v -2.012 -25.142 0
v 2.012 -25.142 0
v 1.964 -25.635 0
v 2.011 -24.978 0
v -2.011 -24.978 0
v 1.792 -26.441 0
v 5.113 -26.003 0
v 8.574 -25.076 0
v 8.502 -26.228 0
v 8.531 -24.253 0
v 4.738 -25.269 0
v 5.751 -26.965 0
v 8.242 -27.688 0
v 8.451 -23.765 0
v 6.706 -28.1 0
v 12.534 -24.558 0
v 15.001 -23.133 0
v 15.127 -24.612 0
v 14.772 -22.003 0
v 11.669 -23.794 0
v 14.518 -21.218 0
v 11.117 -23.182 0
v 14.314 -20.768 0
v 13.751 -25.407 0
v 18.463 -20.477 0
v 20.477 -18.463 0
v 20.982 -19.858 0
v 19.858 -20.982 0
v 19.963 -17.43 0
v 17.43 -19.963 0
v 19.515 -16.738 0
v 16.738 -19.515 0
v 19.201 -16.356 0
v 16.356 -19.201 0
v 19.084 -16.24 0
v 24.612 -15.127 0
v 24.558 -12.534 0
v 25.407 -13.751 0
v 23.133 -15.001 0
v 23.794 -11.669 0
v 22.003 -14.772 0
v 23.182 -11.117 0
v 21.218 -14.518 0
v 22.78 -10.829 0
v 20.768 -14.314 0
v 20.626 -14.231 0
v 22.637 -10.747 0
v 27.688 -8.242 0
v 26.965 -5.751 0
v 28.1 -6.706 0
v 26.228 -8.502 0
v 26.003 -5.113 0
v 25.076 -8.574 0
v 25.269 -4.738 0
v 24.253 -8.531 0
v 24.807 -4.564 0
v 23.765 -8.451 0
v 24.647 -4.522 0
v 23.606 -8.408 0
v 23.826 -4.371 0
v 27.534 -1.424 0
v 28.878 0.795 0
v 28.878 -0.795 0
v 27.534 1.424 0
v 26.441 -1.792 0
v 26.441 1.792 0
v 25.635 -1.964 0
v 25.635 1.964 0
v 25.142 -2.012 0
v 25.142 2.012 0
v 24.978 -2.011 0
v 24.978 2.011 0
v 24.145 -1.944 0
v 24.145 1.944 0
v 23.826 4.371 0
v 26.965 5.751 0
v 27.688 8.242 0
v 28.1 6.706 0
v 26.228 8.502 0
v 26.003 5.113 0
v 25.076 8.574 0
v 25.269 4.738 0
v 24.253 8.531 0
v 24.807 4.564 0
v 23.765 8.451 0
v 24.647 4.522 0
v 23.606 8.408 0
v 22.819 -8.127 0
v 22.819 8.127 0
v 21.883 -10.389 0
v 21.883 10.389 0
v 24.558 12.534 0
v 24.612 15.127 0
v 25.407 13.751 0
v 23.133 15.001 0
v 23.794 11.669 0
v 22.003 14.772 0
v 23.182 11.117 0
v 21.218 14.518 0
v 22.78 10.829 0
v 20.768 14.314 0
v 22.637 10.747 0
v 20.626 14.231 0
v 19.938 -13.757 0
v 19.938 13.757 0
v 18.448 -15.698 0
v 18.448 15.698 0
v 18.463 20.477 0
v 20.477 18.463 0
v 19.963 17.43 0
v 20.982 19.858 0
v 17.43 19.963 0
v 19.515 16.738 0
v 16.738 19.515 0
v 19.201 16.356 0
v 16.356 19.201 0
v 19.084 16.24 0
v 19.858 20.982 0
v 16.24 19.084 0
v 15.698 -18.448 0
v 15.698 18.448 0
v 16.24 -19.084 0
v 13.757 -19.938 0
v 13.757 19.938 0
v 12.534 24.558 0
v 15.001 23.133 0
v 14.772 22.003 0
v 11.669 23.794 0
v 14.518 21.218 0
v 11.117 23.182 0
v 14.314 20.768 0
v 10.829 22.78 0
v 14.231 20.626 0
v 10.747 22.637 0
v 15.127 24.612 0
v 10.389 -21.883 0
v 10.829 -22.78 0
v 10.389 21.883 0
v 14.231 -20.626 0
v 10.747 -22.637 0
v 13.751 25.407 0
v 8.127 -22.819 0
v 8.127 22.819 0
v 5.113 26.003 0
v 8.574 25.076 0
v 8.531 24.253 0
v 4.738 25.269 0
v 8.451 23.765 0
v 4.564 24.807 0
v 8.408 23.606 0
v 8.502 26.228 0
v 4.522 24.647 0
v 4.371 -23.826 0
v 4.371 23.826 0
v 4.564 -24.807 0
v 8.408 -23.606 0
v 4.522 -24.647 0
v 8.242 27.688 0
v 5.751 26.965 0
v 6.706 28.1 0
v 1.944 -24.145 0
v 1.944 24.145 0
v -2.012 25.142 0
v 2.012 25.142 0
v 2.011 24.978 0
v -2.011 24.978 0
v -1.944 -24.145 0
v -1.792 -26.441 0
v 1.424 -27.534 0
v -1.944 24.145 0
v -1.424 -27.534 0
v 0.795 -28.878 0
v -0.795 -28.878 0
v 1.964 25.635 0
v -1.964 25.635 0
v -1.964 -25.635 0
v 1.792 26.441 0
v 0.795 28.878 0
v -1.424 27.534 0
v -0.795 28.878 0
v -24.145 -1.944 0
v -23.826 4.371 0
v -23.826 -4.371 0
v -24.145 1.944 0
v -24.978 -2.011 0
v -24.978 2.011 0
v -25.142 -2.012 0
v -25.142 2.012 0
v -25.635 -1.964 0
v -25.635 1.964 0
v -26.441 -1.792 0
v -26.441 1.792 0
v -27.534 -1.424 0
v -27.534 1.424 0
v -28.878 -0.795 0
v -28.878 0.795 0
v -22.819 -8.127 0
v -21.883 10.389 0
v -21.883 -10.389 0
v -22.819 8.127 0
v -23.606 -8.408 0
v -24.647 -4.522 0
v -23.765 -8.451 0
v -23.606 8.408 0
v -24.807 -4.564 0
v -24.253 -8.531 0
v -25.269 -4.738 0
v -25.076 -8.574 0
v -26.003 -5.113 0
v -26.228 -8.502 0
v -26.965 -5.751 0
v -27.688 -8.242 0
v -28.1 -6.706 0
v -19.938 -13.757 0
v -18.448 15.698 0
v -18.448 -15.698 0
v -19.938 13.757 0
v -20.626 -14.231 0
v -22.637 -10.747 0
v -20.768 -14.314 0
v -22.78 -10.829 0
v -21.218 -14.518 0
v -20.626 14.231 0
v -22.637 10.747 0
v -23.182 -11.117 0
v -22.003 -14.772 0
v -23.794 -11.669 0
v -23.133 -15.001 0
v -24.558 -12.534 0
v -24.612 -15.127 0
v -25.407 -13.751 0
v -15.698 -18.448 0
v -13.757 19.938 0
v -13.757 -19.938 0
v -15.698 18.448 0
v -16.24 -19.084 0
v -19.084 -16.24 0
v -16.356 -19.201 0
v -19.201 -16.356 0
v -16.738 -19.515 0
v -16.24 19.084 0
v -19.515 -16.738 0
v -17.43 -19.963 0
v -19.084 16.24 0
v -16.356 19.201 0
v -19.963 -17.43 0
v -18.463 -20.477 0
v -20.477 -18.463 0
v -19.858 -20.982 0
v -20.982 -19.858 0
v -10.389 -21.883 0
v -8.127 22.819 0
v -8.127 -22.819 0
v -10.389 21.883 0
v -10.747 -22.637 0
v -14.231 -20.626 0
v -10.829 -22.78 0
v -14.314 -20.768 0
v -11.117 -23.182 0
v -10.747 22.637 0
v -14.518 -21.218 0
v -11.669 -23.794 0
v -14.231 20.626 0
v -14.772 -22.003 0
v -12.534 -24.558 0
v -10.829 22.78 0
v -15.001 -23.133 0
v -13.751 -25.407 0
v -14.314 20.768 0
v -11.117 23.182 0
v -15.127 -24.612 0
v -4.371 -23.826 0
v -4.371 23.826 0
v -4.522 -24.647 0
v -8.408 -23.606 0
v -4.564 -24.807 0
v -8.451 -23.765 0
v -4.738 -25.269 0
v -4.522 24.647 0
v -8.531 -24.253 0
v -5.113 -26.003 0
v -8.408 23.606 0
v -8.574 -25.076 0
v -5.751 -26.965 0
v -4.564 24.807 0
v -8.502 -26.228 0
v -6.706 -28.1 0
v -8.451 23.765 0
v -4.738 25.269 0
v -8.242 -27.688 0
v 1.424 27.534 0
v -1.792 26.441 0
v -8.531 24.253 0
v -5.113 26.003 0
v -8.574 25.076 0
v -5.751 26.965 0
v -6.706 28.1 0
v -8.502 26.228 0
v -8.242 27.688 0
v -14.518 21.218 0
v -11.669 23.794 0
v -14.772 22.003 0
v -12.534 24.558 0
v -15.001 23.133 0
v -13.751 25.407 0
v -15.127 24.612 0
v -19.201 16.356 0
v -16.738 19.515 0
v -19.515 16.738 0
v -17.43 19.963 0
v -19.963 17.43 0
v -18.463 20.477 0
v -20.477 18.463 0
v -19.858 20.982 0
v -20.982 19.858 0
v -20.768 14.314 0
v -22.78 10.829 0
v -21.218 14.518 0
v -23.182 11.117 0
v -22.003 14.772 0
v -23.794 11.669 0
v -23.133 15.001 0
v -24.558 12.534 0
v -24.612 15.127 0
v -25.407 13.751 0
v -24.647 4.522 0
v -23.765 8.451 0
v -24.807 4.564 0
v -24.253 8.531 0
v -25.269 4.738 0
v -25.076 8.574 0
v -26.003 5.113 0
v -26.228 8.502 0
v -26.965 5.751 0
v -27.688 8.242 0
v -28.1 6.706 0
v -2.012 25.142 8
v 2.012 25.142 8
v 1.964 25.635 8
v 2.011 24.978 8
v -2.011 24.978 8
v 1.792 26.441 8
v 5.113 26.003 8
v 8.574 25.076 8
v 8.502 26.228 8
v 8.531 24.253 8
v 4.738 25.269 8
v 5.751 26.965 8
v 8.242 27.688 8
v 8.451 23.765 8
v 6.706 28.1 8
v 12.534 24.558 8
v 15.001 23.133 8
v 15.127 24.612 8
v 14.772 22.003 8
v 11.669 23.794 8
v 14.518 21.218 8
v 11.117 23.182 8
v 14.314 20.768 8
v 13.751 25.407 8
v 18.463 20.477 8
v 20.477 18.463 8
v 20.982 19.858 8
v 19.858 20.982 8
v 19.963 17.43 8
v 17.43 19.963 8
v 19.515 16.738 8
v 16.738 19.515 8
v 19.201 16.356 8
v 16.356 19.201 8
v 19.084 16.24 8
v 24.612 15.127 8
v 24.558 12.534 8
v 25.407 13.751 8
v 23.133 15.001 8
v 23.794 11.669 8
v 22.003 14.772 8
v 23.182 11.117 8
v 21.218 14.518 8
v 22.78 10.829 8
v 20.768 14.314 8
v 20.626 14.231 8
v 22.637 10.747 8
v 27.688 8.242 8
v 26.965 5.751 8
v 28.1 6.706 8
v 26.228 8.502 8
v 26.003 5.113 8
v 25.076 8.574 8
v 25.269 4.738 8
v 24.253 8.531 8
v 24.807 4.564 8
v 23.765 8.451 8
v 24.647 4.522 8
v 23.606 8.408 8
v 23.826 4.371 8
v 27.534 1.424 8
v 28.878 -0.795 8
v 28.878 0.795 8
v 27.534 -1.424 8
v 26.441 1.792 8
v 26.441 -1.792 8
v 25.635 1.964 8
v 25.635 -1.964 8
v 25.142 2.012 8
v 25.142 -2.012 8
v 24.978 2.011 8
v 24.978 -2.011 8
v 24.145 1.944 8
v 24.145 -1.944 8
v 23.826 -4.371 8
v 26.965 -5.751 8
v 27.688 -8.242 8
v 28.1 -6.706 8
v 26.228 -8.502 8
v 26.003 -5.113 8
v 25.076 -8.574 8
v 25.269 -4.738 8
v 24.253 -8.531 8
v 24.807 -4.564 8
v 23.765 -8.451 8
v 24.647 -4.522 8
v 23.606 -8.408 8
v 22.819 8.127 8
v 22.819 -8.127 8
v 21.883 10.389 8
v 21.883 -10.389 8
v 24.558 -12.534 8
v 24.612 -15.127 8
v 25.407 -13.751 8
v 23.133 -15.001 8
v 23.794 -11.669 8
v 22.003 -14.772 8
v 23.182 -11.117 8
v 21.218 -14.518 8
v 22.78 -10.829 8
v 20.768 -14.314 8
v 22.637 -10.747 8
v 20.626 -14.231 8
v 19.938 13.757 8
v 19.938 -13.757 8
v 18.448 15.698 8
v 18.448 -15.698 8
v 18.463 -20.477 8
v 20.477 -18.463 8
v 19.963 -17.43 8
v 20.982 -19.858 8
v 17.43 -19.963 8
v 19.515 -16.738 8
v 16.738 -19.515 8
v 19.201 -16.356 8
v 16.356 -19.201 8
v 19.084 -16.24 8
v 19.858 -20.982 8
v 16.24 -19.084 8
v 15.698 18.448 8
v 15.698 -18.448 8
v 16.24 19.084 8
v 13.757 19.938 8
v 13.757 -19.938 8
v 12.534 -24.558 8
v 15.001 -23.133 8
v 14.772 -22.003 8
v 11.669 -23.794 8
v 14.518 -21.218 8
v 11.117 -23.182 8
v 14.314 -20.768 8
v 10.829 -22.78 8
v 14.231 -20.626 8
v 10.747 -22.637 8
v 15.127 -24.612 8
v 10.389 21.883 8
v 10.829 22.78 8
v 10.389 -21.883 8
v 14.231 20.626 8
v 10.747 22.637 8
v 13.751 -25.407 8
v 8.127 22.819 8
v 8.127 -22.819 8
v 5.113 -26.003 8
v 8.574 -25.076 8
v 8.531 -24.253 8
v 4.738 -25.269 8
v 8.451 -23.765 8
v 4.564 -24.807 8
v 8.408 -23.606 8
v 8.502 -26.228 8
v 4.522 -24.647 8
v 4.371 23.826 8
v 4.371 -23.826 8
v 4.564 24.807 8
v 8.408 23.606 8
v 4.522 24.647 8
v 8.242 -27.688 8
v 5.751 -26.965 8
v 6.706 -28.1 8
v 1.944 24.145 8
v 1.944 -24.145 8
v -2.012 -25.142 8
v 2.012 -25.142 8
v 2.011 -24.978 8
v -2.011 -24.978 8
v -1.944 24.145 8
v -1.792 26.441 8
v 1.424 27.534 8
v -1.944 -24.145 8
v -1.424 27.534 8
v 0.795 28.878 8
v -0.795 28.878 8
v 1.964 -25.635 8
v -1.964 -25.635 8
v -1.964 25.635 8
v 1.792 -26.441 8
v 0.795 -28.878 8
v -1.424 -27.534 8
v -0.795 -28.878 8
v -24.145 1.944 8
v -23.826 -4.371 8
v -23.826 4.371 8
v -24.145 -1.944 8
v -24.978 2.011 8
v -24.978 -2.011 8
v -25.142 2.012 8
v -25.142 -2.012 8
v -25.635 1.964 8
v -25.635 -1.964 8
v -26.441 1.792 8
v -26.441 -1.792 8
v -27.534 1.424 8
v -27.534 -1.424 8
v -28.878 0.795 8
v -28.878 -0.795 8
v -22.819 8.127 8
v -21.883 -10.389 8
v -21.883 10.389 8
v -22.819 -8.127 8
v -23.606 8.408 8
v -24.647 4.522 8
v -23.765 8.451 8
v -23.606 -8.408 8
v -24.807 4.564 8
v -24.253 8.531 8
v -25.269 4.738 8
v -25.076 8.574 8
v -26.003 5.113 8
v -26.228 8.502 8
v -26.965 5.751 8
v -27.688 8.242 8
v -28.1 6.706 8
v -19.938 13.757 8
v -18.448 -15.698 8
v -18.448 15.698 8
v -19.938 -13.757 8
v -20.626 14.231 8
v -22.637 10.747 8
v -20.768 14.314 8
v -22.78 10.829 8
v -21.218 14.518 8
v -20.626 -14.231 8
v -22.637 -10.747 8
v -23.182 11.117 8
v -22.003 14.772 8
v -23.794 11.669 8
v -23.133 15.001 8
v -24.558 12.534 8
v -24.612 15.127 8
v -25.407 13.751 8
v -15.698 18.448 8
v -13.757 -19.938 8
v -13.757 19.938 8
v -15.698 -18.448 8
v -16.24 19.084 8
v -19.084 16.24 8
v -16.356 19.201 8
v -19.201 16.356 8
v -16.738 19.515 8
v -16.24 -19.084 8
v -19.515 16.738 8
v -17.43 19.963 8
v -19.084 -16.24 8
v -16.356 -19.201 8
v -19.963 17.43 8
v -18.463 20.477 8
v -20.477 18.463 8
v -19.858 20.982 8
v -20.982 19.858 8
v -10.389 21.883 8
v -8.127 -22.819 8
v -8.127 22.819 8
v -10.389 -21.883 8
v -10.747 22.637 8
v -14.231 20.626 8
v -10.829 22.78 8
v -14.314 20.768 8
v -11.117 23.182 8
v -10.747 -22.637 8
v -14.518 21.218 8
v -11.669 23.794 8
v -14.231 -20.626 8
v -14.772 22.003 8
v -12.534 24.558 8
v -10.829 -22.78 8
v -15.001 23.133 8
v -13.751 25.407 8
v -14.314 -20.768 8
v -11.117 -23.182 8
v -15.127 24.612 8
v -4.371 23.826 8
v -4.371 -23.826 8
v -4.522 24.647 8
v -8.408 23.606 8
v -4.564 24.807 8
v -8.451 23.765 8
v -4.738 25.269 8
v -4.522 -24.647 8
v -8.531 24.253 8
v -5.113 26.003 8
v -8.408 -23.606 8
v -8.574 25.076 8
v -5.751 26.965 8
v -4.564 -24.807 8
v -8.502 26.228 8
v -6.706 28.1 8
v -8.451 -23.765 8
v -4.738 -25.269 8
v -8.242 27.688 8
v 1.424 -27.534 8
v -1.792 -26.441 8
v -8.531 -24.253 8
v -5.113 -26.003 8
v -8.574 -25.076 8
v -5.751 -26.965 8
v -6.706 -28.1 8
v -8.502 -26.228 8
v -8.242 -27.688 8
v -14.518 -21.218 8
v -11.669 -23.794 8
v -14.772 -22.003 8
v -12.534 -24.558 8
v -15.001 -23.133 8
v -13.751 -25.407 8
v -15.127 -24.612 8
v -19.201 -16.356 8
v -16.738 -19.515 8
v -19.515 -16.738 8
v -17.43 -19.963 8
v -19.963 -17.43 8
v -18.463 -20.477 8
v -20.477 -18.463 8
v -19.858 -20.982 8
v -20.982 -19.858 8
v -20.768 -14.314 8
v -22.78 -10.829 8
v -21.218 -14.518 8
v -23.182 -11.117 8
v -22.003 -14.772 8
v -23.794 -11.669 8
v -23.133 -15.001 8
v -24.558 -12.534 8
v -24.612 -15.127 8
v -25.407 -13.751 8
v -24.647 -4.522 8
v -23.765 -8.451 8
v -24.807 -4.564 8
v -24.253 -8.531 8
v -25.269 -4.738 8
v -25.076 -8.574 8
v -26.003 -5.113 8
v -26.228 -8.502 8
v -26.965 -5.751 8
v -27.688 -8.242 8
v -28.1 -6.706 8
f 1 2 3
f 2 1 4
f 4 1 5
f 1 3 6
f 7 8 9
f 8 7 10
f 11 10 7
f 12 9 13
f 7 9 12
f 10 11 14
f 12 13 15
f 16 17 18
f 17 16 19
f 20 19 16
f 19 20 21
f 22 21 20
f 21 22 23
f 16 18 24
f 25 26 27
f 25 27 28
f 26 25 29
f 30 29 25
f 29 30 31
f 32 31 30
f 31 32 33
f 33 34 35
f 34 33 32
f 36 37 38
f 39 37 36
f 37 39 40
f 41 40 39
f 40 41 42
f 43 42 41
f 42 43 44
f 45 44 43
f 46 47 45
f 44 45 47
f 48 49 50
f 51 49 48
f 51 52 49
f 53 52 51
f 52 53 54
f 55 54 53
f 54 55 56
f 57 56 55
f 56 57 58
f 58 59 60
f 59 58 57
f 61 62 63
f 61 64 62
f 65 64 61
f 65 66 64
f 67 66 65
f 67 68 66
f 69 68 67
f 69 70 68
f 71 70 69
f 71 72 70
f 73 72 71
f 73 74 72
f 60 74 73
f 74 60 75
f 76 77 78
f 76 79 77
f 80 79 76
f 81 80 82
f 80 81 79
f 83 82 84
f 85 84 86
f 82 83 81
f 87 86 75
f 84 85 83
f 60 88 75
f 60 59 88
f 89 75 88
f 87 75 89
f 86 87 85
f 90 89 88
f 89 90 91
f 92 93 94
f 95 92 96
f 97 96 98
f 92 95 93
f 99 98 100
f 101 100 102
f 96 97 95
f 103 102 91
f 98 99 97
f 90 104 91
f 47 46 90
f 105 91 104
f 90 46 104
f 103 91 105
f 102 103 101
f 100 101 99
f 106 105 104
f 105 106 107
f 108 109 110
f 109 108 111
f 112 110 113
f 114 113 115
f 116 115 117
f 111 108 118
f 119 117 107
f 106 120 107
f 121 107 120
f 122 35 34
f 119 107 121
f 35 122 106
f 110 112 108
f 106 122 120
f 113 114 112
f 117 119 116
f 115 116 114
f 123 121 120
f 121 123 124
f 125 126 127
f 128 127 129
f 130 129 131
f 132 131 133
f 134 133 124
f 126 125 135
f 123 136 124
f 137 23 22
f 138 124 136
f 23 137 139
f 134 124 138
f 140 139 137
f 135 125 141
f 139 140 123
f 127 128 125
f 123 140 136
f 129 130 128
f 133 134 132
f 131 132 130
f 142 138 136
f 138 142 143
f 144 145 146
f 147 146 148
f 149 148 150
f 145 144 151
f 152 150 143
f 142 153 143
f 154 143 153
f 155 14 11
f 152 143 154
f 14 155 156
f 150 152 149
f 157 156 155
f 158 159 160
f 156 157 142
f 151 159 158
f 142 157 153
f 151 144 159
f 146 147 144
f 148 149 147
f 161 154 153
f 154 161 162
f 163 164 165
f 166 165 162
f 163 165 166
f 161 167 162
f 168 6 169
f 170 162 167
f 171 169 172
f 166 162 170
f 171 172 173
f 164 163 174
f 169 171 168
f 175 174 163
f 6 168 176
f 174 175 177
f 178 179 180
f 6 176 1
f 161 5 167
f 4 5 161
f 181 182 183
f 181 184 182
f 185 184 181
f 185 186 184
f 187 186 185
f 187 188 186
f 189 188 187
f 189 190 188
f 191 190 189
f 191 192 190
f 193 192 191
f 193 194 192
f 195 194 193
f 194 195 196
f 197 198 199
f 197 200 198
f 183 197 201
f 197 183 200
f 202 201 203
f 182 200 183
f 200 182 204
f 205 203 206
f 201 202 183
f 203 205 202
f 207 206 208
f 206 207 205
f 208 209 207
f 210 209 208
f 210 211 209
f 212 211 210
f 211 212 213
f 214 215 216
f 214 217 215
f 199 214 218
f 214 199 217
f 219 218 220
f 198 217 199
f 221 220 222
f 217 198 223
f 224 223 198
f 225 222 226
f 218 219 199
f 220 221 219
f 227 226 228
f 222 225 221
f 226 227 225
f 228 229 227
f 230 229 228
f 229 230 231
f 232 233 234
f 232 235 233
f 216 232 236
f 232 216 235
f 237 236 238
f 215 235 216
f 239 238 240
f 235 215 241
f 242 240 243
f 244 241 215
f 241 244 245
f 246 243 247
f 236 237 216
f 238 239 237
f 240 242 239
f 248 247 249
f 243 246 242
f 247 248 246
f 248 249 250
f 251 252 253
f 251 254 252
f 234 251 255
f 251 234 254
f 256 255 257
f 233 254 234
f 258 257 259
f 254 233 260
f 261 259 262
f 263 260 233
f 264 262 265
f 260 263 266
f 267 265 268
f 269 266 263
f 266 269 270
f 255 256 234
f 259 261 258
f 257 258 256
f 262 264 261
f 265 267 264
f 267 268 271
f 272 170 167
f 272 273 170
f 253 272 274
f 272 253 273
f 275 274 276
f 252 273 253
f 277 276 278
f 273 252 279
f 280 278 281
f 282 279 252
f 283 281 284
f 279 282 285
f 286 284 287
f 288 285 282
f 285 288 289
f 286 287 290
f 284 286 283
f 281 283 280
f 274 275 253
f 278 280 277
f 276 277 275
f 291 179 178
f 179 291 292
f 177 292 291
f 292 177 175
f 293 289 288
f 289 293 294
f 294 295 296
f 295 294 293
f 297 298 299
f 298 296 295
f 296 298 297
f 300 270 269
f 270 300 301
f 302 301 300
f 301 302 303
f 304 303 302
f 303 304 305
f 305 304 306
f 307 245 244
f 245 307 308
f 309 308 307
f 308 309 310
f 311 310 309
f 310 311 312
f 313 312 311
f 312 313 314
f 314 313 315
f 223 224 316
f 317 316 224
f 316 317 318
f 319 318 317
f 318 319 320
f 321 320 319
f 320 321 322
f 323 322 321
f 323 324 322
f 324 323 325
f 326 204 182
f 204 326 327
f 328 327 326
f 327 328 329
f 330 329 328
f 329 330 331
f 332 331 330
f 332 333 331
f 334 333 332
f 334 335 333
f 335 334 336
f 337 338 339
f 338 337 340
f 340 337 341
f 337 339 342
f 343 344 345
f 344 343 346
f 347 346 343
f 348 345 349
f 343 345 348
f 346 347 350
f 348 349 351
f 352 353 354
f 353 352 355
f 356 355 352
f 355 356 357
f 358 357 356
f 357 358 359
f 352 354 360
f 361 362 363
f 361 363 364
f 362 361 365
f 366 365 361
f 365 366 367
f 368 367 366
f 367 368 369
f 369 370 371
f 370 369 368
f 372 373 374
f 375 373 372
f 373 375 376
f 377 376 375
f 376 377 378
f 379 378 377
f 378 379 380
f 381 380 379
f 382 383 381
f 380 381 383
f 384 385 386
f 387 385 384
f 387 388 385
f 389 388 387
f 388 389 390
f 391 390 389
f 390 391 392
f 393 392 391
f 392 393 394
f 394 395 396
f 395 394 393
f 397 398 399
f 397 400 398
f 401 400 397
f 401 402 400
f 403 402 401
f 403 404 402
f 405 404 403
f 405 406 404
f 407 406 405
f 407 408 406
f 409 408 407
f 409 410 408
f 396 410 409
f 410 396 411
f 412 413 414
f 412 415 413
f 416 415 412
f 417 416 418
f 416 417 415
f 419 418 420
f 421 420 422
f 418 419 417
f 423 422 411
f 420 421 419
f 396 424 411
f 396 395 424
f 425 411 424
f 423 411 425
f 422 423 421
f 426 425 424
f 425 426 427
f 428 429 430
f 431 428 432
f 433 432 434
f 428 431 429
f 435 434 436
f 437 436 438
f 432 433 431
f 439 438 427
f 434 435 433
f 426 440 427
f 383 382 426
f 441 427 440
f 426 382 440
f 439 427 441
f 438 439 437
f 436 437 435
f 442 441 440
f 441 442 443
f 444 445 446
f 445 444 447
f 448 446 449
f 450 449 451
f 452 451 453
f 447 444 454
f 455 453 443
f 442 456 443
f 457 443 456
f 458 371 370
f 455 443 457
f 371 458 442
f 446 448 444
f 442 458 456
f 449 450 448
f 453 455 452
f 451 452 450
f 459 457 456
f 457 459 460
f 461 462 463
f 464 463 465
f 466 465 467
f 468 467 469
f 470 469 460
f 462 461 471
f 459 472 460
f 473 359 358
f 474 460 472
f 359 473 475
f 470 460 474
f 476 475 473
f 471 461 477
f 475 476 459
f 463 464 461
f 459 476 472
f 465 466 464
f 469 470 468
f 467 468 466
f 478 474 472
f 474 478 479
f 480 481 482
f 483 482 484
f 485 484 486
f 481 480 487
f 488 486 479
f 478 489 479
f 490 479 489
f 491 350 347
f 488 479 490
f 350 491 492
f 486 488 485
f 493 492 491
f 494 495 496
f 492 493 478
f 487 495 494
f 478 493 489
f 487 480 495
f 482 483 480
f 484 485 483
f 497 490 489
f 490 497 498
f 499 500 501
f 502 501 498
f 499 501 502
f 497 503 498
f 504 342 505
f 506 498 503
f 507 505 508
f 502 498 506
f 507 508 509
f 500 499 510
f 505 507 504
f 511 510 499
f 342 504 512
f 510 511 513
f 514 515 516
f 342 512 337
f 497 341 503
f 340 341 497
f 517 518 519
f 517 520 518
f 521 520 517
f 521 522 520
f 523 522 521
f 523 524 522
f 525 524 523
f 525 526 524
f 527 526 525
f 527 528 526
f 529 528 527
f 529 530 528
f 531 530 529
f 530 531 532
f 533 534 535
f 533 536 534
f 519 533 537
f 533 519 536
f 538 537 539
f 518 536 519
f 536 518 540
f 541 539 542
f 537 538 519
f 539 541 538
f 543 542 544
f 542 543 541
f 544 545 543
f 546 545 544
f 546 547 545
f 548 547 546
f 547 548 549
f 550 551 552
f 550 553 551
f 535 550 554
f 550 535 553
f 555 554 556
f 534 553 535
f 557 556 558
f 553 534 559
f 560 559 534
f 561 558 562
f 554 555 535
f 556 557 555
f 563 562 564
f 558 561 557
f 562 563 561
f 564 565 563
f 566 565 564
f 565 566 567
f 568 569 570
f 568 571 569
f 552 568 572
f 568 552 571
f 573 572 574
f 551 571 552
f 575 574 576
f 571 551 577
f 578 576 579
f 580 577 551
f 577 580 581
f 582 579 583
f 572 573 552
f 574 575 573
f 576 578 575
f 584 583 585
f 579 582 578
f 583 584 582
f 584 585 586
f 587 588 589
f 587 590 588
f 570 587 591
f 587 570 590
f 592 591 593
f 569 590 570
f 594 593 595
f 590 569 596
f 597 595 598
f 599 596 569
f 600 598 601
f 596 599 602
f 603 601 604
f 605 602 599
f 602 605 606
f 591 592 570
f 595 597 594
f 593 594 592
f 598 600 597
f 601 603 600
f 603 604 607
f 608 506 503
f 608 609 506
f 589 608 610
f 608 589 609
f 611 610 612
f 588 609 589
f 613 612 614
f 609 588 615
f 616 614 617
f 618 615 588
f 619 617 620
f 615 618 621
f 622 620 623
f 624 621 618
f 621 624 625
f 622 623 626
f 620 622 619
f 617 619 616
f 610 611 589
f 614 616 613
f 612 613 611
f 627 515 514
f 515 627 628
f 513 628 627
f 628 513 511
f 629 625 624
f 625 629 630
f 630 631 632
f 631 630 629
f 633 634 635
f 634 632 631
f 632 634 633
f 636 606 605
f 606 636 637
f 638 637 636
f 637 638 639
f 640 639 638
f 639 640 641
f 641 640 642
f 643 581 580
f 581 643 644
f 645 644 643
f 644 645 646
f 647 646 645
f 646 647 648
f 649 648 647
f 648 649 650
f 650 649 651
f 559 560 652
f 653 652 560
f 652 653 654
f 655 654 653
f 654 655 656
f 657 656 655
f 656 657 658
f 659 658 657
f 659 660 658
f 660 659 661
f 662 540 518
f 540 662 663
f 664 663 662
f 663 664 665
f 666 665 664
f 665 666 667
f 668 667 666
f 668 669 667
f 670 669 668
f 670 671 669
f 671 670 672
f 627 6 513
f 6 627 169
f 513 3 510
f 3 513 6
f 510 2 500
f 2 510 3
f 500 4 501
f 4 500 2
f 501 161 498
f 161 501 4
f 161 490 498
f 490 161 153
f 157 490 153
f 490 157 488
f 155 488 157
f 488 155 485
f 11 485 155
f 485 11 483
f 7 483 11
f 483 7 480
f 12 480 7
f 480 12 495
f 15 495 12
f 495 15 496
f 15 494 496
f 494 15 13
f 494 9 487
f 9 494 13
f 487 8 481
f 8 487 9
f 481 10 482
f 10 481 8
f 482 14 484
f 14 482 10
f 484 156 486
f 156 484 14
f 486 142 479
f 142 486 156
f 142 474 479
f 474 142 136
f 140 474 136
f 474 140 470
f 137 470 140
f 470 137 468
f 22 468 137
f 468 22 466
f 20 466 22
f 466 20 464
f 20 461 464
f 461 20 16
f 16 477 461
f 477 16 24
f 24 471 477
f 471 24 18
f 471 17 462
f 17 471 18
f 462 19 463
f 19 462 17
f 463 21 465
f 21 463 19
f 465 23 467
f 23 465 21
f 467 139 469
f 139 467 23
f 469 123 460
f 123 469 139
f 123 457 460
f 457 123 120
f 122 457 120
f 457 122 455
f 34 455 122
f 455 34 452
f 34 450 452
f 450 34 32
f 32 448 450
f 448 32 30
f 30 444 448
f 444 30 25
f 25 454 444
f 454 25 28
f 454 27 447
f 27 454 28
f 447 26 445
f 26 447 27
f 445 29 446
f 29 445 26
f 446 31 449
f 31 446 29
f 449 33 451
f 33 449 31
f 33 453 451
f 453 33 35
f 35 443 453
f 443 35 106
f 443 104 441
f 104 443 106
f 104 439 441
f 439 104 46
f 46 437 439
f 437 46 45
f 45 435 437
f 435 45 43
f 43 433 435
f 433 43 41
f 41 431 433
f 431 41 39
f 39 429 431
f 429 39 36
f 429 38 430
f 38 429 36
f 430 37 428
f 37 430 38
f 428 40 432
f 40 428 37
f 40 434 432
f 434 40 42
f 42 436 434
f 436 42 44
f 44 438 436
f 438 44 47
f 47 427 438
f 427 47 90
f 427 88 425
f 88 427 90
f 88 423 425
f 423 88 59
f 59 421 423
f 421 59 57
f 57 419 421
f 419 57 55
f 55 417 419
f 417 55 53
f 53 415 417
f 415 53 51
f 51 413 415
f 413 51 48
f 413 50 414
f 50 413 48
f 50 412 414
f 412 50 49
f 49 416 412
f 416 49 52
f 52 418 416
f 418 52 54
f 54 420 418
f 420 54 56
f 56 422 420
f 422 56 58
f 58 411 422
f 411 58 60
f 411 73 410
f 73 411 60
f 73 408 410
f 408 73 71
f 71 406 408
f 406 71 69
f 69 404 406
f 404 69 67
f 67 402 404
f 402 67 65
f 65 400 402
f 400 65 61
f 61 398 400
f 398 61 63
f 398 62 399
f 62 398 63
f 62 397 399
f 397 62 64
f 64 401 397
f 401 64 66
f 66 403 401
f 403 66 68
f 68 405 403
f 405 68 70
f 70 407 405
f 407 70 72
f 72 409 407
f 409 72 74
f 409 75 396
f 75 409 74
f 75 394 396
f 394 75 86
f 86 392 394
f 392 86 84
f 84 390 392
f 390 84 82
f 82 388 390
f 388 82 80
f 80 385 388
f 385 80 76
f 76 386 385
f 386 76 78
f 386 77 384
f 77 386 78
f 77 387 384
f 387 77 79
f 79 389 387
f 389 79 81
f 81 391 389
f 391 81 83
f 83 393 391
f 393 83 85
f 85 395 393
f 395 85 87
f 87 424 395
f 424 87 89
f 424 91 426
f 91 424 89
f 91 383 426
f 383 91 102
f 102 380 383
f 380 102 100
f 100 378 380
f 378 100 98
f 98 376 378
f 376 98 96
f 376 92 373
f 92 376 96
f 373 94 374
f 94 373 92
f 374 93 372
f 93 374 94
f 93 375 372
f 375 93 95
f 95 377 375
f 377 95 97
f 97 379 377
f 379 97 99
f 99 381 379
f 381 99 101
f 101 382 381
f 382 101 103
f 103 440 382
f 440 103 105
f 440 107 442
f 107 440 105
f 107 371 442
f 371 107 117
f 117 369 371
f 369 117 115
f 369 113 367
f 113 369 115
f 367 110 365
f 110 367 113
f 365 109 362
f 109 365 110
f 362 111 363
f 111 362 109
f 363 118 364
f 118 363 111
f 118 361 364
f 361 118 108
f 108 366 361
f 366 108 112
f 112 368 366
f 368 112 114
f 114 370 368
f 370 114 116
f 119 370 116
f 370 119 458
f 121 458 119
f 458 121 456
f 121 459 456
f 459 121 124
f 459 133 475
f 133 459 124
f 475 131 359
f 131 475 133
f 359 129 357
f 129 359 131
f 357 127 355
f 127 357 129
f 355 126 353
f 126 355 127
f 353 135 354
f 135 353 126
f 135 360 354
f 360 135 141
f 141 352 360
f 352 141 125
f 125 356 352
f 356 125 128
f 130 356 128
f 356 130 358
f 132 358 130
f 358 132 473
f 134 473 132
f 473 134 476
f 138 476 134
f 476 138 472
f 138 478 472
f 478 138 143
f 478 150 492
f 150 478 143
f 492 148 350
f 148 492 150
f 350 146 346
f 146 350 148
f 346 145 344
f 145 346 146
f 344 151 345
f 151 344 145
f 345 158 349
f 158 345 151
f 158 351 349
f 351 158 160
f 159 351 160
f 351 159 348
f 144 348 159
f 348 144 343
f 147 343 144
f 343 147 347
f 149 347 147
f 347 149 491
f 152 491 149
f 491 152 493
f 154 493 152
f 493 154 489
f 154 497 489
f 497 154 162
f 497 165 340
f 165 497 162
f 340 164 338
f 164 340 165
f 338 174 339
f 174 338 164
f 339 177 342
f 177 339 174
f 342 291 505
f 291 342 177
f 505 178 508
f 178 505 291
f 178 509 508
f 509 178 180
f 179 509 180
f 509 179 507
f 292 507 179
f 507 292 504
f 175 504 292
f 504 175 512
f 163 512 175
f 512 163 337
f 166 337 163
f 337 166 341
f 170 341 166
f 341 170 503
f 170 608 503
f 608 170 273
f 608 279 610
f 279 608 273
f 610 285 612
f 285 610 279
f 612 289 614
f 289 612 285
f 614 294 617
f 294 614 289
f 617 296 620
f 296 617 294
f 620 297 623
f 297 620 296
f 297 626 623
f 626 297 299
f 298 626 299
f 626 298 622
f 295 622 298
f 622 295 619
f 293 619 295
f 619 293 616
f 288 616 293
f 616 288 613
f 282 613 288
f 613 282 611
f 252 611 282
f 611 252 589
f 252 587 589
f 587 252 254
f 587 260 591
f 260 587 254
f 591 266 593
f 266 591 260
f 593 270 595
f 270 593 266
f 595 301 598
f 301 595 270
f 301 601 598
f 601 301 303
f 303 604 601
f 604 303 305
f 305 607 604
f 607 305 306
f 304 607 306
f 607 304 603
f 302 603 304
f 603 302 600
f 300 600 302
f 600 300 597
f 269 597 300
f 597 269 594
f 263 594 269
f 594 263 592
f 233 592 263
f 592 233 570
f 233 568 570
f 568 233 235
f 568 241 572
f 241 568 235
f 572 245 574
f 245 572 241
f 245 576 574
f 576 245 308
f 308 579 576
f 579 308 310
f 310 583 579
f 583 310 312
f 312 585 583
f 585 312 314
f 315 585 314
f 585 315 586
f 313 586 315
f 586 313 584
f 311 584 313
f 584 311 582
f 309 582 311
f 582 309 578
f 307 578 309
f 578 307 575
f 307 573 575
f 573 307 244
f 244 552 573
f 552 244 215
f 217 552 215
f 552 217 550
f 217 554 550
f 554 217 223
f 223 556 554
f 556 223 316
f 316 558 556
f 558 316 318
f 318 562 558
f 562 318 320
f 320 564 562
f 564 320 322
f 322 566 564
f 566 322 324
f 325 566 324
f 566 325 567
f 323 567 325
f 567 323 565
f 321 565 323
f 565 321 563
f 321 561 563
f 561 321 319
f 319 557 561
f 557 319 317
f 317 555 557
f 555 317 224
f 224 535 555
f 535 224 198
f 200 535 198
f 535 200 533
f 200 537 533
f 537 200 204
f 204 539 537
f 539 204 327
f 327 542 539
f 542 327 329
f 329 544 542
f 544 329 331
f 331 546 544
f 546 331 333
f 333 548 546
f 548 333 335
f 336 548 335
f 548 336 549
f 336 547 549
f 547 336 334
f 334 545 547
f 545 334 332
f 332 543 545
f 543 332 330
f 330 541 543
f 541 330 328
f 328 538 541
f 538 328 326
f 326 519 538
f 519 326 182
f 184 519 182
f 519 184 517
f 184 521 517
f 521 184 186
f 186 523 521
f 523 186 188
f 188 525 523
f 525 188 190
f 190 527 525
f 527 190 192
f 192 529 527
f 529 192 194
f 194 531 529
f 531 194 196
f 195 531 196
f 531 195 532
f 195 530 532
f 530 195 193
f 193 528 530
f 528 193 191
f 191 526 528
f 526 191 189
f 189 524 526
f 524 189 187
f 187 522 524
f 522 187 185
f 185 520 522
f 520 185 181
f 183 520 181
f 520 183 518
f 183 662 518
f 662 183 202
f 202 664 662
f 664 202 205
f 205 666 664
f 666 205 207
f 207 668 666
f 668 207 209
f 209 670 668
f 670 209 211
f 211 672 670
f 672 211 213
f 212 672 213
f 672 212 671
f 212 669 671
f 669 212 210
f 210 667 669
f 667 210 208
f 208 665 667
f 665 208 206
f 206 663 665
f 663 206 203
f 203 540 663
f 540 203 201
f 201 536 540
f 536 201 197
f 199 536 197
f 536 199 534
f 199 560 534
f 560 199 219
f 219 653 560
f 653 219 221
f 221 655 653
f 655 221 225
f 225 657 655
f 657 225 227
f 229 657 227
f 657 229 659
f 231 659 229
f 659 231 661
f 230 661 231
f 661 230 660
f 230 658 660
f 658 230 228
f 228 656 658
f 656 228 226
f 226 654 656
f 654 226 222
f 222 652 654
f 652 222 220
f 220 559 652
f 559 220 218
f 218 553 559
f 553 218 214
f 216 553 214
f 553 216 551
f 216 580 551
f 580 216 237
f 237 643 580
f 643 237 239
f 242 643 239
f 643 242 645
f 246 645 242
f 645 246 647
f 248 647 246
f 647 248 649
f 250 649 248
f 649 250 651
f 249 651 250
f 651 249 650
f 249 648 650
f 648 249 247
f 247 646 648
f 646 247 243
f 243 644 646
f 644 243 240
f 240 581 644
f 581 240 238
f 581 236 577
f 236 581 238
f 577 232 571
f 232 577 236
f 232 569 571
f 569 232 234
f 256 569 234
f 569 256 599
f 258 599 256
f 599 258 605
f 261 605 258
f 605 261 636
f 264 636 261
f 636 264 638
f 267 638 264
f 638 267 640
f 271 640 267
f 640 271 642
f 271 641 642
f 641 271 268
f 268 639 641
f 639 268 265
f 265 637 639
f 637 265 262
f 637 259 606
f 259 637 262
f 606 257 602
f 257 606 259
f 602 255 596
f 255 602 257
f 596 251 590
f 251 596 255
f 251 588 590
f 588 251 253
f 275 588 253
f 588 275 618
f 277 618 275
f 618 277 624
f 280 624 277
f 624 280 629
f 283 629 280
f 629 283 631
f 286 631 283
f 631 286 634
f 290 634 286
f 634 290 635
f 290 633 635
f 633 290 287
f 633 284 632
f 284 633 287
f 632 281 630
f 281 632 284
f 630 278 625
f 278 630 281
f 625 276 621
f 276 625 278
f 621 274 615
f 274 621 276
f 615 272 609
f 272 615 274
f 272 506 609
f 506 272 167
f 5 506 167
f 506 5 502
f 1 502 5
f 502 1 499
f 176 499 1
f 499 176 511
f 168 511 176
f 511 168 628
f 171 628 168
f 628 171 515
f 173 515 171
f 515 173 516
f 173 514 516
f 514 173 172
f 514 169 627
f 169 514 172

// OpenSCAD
/******************************************************/
/* peristaltic extruder for 3d printing     		  */
/* file: engranaje_motor.scad			 			  */
/* author: luis rodriguez				 	          */
/* version: 0.1						 		          */
/* w3b: tiny.cc/lyu     					 		  */
/* info:				    				 		  */
/******************************************************/
// @todo: - 

use <involute_gears.scad>
// Rim = llanta; bore

color("indigo")
union(){
gear (number_of_teeth=24,
	circular_pitch=400,
	hub_thickness=4,
	pressure_angle=20);


translate( [ 0 ,
 0, 
 8/2]) {

cylinder(r=20, h=8, center=true);	
}

}

/*module gear (
	number_of_teeth=15,
	circular_pitch=false, diametral_pitch=false,
	pressure_angle=28,
	clearance = 0.2,
	gear_thickness=5,
	rim_thickness=8,
	rim_width=5,
	hub_thickness=10,
	hub_diameter=15,
	bore_diameter=5,
	circles=0,
	backlash=0,
	twist=0,
	involute_facets=0,
	flat=false)*/
